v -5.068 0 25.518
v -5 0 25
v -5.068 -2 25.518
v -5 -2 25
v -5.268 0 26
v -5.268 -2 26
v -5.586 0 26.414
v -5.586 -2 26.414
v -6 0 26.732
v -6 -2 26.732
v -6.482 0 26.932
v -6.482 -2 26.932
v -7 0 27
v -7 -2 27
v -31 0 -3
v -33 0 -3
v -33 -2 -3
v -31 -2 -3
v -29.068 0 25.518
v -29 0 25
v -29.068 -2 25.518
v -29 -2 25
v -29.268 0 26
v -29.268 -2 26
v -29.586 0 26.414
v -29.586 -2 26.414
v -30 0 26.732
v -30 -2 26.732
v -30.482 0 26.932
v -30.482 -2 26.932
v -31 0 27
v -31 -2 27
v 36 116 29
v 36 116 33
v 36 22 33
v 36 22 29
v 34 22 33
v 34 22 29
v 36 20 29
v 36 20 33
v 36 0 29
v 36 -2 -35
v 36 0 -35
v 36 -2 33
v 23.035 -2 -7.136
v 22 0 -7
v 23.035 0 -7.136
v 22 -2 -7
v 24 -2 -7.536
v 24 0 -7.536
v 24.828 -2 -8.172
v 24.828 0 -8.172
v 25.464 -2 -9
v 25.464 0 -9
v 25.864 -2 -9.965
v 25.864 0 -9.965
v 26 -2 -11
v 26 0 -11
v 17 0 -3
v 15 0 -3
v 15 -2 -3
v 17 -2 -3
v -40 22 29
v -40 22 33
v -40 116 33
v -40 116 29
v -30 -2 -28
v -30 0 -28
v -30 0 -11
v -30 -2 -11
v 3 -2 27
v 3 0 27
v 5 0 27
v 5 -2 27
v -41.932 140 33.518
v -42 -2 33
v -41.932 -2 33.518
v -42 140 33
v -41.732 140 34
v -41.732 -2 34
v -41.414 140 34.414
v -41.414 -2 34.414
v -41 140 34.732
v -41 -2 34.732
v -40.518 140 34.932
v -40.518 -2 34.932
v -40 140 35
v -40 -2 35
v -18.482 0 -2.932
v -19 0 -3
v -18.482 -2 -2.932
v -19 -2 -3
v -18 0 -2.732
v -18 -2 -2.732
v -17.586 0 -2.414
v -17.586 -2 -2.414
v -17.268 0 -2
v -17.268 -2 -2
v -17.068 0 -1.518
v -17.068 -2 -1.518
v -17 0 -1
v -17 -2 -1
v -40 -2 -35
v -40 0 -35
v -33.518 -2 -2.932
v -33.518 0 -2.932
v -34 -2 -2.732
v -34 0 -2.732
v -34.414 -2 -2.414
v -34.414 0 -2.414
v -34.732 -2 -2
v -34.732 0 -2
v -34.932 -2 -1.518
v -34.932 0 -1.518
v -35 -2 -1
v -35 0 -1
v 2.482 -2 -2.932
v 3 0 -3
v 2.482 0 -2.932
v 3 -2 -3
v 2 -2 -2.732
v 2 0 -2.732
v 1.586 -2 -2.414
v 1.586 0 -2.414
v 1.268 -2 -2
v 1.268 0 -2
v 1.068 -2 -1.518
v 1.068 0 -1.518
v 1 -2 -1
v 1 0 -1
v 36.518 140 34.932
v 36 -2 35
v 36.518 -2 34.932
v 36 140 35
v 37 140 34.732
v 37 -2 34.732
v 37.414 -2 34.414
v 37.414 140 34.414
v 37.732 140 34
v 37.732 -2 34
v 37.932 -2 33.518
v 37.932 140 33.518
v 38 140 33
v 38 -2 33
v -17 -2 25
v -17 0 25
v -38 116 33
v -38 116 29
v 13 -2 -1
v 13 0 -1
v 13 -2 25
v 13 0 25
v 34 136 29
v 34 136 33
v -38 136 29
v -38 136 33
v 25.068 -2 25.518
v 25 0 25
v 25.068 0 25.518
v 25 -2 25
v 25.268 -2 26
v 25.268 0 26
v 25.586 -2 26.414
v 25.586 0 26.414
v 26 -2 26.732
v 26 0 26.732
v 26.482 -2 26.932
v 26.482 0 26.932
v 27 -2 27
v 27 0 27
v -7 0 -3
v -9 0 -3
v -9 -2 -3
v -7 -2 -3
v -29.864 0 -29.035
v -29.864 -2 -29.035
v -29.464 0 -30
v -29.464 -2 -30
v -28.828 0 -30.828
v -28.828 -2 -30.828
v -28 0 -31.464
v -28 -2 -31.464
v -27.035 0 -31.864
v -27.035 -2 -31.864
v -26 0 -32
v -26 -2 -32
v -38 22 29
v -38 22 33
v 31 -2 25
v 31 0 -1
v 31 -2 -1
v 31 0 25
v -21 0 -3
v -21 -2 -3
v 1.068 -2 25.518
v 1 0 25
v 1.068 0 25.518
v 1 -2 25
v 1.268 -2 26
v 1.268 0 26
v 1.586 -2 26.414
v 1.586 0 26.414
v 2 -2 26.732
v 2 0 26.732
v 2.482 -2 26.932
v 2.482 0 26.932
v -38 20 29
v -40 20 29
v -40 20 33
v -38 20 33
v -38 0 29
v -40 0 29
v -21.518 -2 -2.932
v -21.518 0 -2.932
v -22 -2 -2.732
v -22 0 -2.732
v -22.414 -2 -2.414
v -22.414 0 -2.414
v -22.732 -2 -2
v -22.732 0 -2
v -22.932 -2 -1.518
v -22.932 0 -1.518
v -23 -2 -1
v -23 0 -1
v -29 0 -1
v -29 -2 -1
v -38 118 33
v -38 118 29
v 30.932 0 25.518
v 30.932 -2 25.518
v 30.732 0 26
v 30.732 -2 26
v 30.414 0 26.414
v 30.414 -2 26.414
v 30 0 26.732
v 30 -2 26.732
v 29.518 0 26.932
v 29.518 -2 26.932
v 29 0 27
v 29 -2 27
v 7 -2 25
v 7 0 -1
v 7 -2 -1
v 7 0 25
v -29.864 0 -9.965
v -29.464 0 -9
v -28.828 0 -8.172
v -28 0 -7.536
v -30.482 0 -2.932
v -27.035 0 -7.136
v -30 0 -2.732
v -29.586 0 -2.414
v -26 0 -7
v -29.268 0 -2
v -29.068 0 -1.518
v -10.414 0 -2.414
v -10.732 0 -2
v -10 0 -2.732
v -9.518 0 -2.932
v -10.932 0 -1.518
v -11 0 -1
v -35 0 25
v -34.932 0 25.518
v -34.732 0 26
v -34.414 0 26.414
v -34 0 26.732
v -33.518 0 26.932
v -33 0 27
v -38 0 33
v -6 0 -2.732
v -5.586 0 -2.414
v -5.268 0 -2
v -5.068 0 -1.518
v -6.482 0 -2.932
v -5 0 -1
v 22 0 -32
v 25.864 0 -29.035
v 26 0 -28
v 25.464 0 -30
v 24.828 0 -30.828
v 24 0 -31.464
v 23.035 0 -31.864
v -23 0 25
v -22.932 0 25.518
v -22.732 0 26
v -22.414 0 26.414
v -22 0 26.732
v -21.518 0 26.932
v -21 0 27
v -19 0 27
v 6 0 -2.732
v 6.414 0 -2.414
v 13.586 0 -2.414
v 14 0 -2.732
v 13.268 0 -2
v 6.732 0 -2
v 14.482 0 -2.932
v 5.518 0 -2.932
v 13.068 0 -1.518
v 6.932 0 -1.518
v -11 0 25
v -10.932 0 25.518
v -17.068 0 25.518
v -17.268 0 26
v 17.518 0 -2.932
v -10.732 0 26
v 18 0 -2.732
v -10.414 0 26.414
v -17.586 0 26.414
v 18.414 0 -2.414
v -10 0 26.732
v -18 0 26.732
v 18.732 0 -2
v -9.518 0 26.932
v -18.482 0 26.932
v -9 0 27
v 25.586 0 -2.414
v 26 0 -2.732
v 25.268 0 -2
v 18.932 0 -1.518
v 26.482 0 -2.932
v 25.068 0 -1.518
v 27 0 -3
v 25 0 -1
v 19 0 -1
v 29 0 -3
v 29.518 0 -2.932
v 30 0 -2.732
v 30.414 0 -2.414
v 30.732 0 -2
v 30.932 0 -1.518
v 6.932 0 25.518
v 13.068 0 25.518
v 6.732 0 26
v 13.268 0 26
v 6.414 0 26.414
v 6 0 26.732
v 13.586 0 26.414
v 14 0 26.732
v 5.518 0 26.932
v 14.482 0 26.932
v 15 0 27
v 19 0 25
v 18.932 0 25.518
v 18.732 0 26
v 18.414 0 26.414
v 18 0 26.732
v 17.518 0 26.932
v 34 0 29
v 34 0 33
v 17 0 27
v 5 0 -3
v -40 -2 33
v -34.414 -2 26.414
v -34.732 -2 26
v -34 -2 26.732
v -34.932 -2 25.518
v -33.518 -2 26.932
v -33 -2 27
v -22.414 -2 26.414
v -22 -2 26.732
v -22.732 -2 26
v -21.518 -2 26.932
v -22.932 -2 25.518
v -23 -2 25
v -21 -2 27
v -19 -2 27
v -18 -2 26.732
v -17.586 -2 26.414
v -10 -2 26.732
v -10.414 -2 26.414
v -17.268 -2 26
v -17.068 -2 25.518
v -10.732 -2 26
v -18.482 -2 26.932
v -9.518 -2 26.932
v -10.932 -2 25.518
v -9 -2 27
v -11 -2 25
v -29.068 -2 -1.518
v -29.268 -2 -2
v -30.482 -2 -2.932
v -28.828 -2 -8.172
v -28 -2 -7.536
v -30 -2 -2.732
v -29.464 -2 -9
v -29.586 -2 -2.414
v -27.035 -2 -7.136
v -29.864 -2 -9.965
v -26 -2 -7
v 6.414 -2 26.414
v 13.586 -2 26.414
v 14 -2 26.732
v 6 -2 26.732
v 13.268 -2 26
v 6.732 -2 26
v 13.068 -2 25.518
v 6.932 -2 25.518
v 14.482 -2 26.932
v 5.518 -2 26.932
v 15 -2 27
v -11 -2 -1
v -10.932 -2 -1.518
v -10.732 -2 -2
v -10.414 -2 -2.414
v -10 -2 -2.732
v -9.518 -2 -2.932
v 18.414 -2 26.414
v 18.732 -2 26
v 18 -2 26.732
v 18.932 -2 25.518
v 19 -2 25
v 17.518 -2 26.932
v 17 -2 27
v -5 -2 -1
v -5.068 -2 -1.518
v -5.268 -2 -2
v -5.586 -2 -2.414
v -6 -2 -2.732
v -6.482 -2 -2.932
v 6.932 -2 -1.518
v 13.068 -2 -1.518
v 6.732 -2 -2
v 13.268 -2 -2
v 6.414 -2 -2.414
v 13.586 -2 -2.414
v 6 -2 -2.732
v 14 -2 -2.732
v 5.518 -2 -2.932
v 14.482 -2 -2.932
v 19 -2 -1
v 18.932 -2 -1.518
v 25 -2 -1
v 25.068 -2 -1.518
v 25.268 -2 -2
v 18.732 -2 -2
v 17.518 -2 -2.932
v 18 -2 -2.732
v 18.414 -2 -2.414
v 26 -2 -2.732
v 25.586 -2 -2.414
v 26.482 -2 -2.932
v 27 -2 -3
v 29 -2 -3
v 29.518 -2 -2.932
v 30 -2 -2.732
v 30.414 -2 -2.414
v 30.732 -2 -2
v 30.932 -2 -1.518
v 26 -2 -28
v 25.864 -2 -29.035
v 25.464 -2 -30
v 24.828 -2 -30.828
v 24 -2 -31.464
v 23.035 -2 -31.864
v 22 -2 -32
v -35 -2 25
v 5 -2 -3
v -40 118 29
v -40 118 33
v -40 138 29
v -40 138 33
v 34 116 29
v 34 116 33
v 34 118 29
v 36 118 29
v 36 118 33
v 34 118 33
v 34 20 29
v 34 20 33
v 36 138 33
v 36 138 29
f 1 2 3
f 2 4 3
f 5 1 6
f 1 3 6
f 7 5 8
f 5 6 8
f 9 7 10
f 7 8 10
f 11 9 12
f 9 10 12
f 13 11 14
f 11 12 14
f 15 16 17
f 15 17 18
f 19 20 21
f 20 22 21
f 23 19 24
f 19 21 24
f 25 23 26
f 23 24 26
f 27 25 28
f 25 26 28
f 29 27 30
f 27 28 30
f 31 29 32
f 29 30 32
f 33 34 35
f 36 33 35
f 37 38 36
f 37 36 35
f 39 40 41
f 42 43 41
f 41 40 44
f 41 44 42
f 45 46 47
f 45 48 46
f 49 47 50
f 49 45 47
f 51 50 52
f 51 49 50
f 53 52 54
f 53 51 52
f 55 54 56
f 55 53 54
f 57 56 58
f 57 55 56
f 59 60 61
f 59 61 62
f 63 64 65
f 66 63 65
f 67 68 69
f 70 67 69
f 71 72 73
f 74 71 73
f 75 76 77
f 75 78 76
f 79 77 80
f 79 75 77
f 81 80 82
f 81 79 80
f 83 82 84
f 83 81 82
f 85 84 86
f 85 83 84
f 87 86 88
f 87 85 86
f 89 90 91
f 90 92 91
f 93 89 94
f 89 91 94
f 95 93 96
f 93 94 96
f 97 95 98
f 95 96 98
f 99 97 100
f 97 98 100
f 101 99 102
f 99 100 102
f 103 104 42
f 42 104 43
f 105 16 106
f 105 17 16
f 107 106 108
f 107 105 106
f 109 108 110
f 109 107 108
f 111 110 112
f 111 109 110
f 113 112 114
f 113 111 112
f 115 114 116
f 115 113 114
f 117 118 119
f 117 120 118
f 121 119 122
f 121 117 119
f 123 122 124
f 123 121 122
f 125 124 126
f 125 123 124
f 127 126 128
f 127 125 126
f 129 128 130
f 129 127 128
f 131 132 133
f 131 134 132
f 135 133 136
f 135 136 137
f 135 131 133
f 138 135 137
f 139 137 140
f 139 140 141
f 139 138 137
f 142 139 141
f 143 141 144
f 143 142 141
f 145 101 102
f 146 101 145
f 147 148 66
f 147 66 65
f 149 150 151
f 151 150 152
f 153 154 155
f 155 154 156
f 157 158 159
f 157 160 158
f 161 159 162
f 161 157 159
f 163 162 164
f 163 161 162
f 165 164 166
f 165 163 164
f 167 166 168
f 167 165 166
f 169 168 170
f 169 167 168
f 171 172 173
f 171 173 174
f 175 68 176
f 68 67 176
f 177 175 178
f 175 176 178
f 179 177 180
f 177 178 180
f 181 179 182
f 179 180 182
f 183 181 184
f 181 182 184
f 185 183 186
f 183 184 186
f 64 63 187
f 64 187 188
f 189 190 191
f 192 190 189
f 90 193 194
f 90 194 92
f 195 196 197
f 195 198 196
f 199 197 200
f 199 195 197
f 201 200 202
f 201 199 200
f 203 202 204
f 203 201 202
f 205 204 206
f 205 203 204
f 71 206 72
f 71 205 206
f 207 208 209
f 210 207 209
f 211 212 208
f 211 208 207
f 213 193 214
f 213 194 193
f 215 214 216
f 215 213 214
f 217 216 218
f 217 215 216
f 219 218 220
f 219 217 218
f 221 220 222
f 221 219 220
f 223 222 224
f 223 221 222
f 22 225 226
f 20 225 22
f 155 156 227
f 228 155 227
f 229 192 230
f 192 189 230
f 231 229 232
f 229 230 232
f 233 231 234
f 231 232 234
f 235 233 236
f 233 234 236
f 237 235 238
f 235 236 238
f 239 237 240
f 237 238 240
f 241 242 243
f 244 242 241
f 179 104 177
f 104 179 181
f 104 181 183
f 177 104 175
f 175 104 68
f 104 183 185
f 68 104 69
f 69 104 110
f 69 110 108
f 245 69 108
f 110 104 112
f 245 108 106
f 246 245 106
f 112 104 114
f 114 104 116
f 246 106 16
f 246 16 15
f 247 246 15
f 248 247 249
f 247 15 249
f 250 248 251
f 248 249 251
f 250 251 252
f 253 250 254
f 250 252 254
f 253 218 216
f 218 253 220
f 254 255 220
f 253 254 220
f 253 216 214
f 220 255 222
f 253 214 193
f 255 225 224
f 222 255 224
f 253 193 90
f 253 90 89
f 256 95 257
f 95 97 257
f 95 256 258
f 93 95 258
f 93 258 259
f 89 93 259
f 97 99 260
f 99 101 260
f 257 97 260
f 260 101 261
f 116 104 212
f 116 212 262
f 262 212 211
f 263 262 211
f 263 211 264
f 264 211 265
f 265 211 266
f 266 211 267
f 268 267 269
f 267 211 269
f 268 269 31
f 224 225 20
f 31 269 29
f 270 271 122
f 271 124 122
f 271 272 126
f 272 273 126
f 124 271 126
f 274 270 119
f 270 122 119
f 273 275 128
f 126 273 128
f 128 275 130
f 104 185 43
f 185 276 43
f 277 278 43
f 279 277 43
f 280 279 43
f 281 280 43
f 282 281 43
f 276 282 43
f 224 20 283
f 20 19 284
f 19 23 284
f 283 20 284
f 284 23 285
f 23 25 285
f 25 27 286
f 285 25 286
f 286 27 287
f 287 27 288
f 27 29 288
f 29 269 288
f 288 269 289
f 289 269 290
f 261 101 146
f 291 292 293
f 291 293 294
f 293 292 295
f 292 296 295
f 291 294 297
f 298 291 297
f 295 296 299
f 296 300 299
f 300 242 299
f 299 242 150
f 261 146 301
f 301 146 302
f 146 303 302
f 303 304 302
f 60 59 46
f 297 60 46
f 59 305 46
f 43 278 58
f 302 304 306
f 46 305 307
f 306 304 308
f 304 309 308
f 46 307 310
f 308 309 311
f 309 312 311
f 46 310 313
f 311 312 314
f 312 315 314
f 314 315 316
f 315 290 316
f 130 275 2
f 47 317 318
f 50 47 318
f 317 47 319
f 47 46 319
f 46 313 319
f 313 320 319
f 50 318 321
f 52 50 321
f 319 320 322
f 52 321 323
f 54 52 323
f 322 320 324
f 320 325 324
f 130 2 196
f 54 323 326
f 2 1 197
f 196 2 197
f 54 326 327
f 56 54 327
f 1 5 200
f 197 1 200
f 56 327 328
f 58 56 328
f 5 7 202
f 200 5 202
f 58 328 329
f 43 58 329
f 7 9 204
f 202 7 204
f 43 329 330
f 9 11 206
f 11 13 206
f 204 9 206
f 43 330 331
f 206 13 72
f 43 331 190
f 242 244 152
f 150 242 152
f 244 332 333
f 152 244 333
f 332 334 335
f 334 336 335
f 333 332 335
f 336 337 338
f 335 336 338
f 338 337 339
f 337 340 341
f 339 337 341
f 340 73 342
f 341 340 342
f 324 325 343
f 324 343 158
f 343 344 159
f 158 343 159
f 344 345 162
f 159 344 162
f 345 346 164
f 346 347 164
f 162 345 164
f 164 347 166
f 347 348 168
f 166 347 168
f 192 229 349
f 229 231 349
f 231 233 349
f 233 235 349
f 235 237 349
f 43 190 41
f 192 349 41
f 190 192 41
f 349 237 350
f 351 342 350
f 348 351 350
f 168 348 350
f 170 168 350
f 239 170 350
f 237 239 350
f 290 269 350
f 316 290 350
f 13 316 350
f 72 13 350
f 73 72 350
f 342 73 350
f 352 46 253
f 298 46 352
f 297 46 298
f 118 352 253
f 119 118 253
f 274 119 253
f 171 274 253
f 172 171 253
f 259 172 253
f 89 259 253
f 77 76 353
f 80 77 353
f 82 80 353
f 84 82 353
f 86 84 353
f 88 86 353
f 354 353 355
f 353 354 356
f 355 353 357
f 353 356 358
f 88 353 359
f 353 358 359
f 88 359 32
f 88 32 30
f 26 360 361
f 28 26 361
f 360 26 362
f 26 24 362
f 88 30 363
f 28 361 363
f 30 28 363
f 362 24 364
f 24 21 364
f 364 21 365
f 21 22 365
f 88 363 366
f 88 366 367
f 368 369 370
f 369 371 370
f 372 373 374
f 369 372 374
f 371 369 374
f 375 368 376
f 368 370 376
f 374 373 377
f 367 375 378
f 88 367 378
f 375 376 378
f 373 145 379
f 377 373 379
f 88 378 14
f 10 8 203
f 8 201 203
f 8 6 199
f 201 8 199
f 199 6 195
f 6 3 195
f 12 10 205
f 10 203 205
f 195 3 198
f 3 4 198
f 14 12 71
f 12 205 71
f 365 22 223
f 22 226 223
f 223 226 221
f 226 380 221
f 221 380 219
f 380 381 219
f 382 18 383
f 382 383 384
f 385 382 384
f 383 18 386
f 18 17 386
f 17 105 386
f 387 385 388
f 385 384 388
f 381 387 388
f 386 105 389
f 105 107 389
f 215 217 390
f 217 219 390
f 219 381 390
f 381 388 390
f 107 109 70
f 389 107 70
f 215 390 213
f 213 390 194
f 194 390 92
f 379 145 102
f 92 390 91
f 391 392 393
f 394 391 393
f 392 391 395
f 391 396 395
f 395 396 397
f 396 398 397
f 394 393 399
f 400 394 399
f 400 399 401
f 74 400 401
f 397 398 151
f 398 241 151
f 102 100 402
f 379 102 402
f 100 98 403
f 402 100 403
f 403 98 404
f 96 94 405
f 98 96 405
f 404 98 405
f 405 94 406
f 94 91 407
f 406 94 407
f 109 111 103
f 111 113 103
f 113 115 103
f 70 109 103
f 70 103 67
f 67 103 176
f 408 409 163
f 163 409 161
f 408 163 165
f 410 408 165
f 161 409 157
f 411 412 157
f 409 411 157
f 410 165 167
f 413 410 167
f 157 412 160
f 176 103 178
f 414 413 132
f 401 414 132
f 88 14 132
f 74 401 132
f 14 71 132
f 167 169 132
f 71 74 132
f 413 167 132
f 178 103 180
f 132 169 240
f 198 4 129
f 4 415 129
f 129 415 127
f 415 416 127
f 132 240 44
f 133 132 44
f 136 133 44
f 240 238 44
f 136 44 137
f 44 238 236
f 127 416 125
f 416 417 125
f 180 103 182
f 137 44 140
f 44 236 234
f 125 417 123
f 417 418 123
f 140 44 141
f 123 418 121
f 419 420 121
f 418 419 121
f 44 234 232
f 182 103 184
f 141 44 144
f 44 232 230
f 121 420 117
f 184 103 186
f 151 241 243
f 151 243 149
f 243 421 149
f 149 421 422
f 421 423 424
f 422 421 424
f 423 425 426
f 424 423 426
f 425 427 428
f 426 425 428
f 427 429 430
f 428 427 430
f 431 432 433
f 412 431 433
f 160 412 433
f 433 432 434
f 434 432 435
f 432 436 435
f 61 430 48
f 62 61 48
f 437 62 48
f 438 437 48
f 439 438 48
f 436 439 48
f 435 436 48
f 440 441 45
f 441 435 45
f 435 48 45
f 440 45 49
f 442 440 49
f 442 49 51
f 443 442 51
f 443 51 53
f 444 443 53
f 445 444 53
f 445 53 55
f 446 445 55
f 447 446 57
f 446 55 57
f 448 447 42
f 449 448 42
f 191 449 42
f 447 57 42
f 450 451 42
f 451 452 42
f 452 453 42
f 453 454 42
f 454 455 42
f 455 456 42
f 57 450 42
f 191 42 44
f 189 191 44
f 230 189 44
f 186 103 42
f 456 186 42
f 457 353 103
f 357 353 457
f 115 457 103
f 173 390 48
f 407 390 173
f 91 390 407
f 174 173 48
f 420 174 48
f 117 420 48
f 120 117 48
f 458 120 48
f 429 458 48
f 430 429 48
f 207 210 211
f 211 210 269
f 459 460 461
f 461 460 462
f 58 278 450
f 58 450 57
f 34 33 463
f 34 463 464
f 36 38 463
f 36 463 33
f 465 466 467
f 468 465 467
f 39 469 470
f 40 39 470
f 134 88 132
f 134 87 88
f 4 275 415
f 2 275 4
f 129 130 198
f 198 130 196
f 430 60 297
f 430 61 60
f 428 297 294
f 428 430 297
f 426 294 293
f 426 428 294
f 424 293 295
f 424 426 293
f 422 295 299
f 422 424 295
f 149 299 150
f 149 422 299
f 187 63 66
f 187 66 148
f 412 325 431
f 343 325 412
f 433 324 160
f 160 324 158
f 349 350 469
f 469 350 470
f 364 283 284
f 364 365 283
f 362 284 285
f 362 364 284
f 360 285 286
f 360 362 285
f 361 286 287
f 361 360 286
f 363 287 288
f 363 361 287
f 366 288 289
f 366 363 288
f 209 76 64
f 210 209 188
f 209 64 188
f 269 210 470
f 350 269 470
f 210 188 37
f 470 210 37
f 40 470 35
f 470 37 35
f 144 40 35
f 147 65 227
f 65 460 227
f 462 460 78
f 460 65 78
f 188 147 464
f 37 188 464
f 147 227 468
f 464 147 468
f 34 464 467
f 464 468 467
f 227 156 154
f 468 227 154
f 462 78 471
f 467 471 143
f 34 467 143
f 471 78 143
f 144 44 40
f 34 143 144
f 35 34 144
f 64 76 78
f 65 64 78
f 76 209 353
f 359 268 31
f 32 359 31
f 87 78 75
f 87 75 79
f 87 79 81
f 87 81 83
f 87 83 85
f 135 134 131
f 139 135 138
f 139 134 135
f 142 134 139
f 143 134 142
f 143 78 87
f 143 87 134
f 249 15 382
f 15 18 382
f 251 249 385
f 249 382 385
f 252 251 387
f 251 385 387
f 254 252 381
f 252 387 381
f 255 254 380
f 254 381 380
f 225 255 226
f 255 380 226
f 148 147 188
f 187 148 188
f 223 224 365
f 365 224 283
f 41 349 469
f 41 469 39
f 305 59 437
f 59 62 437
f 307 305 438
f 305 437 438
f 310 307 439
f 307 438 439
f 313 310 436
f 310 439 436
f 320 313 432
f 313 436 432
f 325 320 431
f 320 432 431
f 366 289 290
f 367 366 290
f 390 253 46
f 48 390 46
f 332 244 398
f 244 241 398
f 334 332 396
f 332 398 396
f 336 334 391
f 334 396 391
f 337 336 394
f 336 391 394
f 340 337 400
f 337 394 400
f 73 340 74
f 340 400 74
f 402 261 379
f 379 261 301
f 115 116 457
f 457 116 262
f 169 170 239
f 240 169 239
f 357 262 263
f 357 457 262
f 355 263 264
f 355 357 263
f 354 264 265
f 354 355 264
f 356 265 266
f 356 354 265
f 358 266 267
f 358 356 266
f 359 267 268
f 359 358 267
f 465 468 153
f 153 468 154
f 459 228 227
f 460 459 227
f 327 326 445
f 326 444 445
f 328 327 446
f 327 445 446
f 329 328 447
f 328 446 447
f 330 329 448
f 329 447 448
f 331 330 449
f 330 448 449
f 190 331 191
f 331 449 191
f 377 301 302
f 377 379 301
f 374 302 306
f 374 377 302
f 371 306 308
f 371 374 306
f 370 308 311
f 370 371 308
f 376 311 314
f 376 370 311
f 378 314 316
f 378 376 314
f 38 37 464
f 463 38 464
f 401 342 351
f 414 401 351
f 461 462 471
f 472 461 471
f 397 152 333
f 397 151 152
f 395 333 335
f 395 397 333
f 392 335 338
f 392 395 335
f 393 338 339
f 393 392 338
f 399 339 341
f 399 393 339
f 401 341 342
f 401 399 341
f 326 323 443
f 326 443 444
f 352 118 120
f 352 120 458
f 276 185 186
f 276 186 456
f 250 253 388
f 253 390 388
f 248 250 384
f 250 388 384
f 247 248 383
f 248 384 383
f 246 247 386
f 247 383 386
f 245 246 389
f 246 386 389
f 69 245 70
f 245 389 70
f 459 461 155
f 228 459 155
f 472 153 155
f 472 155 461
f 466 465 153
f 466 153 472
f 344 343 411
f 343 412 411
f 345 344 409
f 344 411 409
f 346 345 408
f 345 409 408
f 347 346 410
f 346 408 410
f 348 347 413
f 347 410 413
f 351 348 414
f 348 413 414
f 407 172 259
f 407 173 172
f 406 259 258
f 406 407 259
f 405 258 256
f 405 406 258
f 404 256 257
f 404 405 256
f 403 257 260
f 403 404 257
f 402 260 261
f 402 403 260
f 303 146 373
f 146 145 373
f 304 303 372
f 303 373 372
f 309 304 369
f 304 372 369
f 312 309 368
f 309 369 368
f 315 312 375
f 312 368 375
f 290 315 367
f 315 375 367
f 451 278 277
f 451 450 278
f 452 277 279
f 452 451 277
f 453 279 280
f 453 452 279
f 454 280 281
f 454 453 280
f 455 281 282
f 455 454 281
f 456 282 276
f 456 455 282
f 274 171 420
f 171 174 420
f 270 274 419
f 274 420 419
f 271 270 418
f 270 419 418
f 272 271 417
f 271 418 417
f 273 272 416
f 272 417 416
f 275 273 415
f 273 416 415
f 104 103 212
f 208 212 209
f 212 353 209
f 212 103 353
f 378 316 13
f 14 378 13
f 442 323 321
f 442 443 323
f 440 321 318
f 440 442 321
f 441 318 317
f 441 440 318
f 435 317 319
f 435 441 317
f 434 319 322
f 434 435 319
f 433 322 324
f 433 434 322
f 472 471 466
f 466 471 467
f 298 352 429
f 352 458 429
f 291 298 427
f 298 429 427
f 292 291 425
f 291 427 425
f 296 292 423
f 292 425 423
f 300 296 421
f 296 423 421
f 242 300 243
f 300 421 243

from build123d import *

# Parameters (mm, degrees)
F0_W      = 76
F0_H      = 68
F0_W_2    = 56
F0_H_2    = 25
F0_W_3    = 6
F0_H_3    = 30
F1_DEPTH  = 2
F2_W      = 80
F2_H      = 142
F3_DEPTH  = 2
F4_R      = 1.99999
F6_DEPTH  = 4
F7_R      = 4
F8_R      = 2
F9_W      = 2
F9_H      = 4
F10_DEPTH = 100


# Not quite as in the source:
# - a fillet or chamfer is up to 0.001 mm smaller than in the source, because OpenCascade refuses the exact size


with BuildPart() as f1:
    # F0 (on Front) → F1 (new body)
    with BuildSketch(Plane.XZ):
        with Locations((-2, -1)):
            Rectangle(F0_W, F0_H)
        with Locations((-2, -19.5)):
            Rectangle(F0_W_2, F0_H_2, mode=Mode.SUBTRACT)
        with Locations((-32, 12)):
            Rectangle(F0_W_3, F0_H_3, mode=Mode.SUBTRACT)
        with Locations((-20, 12)):
            Rectangle(F0_W_3, F0_H_3, mode=Mode.SUBTRACT)
        with Locations((-8, 12)):
            Rectangle(F0_W_3, F0_H_3, mode=Mode.SUBTRACT)
        with Locations((4, 12)):
            Rectangle(F0_W_3, F0_H_3, mode=Mode.SUBTRACT)
        with Locations((16, 12)):
            Rectangle(F0_W_3, F0_H_3, mode=Mode.SUBTRACT)
        with Locations((28, 12)):
            Rectangle(F0_W_3, F0_H_3, mode=Mode.SUBTRACT)
    extrude(amount=F1_DEPTH)

    # F2 (on face) → F3 (join)
    with BuildSketch(Plane.XY.offset(33)):
        with Locations((-2, 69)):
            Rectangle(F2_W, F2_H)
    extrude(amount=F3_DEPTH)

    # F4 (radius 2 in the source; OpenCascade refuses exactly that, so slightly less here)
    f4_edges = [f1.edges().sort_by_distance(p)[0] for p in [
        (38, 69, 35),
        (-42, 69, 35),
    ]]
    fillet(f4_edges, radius=F4_R)

    # F5 (on face) → F6 (join)
    with BuildSketch(Plane(origin=(0, 0, 33), x_dir=(1, 0, 0), z_dir=(0, 0, -1))):
        Polygon((-38, 0), (-40, 0), (-40, -138), (36, -138), (36, 0), (34, 0), (34, -136), (-38, -136), align=None)
    extrude(amount=F6_DEPTH)

    # F7
    f7_edges = [f1.edges().sort_by_distance(p)[0] for p in [
        (-30, -1, -7),
        (26, -1, -7),
        (-30, -1, -32),
        (26, -1, -32),
    ]]
    fillet(f7_edges, radius=F7_R)

    # F8
    f8_edges = [f1.edges().sort_by_distance(p)[0] for p in [
        (-35, -1, 27),
        (-29, -1, 27),
        (-35, -1, -3),
        (-29, -1, -3),
        (-23, -1, 27),
        (-17, -1, 27),
        (-23, -1, -3),
        (-17, -1, -3),
        (-11, -1, -3),
        (-11, -1, 27),
        (-5, -1, 27),
        (-5, -1, -3),
        (1, -1, -3),
        (7, -1, -3),
        (7, -1, 27),
        (1, -1, 27),
        (13, -1, 27),
        (19, -1, 27),
        (19, -1, -3),
        (13, -1, -3),
        (25, -1, -3),
        (31, -1, -3),
        (25, -1, 27),
        (31, -1, 27),
    ]]
    fillet(f8_edges, radius=F8_R)

    # F9 (on face) → F10 (cut, symmetric)
    with BuildSketch(Plane(origin=(-40, 0, 0), x_dir=(0, -1, 0), z_dir=(-1, 0, 0))):
        with Locations((-117, 31)):
            Rectangle(F9_W, F9_H)
        with Locations((-21, 31)):
            Rectangle(F9_W, F9_H)
    extrude(amount=F10_DEPTH, both=True, mode=Mode.SUBTRACT)


solid = f1.part
